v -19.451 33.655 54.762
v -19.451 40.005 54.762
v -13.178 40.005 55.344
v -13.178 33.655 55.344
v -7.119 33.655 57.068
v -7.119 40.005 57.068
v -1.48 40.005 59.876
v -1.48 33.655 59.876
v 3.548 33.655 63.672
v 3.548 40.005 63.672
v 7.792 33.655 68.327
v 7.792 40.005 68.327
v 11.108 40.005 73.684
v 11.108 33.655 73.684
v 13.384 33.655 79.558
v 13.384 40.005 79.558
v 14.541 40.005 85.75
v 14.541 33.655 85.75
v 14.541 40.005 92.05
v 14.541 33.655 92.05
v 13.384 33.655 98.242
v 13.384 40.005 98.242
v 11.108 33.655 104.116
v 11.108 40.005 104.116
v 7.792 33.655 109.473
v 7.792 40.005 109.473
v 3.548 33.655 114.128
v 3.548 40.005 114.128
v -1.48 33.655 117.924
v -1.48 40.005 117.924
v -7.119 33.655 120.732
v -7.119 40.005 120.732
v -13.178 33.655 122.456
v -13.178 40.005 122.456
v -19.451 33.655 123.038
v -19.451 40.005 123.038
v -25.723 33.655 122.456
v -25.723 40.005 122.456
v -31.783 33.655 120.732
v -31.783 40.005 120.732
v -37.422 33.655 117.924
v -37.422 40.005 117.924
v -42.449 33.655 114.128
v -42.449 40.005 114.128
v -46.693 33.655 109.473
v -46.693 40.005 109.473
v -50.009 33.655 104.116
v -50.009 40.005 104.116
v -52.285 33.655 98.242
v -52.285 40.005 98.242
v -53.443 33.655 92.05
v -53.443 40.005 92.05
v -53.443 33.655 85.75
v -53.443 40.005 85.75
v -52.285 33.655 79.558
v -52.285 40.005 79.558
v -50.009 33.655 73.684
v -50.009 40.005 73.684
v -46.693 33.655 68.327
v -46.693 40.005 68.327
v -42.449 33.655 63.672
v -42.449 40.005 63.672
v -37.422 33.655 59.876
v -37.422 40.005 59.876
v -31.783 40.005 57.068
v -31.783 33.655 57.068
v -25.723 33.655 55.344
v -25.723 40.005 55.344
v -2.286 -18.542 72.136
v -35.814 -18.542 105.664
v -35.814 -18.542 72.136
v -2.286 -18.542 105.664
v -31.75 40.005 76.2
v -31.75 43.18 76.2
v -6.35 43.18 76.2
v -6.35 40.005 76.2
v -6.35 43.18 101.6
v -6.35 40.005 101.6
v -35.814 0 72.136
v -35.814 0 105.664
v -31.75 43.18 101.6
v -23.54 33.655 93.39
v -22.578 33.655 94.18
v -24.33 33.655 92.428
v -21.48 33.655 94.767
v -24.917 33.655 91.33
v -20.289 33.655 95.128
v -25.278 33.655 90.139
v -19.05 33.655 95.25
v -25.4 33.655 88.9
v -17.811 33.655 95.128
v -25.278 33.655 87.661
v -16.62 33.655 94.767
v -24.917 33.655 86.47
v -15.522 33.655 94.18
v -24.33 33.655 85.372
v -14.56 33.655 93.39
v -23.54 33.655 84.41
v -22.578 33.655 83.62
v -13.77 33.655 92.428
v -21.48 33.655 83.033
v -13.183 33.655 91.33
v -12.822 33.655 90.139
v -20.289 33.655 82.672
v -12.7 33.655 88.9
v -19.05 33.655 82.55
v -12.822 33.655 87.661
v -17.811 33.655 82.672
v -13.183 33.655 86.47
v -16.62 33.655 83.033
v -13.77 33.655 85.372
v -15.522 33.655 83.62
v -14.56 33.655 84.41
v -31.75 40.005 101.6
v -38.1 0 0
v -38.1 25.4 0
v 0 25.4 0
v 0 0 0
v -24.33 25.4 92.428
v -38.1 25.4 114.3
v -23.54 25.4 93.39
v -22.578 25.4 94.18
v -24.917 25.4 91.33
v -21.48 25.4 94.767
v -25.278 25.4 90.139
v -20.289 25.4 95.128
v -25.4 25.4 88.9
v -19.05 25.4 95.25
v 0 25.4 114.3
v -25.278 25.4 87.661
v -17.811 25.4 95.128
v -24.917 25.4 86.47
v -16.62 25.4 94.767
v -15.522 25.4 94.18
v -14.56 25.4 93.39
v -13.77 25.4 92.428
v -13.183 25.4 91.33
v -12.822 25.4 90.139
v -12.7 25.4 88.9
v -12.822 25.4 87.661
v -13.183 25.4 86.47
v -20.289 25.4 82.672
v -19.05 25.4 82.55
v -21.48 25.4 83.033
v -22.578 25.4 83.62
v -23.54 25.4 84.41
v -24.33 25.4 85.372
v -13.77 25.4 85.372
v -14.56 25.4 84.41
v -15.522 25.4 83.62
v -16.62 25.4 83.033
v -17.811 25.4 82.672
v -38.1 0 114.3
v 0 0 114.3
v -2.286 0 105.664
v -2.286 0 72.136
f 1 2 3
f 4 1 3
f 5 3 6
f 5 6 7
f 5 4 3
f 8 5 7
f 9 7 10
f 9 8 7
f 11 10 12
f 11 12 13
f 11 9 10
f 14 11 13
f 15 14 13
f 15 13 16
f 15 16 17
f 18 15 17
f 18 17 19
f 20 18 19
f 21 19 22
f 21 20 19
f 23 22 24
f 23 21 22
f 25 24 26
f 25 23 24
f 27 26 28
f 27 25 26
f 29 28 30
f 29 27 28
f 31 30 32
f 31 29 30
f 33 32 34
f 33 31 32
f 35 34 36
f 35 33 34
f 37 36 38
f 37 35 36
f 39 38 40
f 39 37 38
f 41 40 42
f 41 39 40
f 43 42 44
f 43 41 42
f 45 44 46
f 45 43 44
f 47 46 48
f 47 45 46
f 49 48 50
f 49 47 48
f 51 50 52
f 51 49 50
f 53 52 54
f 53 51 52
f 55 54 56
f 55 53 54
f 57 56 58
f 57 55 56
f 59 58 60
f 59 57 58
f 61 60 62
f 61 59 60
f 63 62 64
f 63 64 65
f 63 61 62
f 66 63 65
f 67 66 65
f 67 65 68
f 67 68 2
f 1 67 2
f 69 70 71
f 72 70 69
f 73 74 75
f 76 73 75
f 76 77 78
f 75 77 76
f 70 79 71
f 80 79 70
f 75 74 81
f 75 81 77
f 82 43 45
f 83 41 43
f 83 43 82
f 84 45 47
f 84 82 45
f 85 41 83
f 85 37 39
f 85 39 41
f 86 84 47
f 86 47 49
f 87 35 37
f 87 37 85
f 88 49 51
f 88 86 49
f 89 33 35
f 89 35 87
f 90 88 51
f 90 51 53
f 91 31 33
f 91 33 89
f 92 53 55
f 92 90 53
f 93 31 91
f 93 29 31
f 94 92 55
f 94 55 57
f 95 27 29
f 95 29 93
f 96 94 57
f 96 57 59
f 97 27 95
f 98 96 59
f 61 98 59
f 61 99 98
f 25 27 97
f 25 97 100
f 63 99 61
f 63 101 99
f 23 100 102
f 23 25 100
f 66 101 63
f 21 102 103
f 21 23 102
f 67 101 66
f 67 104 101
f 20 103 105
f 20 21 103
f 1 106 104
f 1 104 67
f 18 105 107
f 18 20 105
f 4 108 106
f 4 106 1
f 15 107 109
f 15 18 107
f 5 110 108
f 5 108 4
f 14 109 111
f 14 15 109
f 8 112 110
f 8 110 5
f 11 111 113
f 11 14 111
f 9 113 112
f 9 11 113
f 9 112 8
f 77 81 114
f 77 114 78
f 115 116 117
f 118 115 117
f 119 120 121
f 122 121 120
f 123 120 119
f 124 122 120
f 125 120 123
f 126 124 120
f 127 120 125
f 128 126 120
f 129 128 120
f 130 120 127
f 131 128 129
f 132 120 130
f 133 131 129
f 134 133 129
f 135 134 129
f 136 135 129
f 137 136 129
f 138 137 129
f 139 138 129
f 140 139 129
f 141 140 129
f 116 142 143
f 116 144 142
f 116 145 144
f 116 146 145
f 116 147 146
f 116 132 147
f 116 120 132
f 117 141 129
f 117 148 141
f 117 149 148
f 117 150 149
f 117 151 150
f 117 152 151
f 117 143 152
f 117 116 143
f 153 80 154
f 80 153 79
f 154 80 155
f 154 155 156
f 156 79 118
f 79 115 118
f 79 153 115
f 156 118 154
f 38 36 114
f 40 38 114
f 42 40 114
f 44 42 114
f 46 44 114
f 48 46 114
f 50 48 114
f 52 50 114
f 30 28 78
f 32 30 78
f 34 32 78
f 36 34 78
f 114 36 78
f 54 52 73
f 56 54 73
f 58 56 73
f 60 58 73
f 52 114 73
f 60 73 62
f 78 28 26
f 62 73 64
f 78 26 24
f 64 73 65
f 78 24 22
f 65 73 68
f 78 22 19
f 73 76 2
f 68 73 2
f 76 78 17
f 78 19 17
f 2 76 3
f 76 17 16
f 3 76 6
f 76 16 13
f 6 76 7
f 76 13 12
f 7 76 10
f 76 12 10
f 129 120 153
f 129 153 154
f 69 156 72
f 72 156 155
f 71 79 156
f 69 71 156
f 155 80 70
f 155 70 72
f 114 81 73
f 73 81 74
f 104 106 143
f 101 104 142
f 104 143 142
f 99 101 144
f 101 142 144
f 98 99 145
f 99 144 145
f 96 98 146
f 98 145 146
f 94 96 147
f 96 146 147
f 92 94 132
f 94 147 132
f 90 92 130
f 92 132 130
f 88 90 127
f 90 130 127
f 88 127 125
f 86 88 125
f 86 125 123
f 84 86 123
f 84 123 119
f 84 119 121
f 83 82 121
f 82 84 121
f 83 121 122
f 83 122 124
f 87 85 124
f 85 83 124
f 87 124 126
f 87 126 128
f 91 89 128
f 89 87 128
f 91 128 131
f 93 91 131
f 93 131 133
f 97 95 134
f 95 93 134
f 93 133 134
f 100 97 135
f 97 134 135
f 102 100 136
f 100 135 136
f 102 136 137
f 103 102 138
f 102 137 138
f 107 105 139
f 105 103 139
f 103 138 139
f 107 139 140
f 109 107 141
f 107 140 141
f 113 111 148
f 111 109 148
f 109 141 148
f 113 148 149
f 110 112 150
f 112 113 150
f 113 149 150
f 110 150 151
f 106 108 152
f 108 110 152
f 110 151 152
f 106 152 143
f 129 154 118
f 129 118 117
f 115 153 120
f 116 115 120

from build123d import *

# Parameters (mm, degrees)
SKETCH1_W           = 38.1
SKETCH1_H           = 25.4
BOSS_EXTRUDE1_DEPTH = 114.3
SKETCH3_W           = 33.528
SKETCH3_H           = 33.528
BOSS_EXTRUDE2_DEPTH = 18.542
SKETCH2_R           = 6.35
BOSS_EXTRUDE3_DEPTH = 17.78
SKETCH4_W           = 25.4
SKETCH4_H           = 25.4
BOSS_EXTRUDE4_DEPTH = 6.35
SKETCH5_R           = 34.1376
BOSS_EXTRUDE5_DEPTH = 3.175


with BuildPart() as part:
    # Sketch1 → Boss-Extrude1 (new body)
    with BuildSketch(Plane.XY):
        with Locations((-19.05, 12.7)):
            Rectangle(SKETCH1_W, SKETCH1_H)
    extrude(amount=BOSS_EXTRUDE1_DEPTH)

    # Sketch3 → Boss-Extrude2 (add)
    with BuildSketch(Plane.XZ):
        with Locations((-19.05, 88.9)):
            Rectangle(SKETCH3_W, SKETCH3_H)
    extrude(amount=BOSS_EXTRUDE2_DEPTH)

    # Sketch2 → Boss-Extrude3 (add)
    with BuildSketch(Plane(origin=(0, 25.4, 0), x_dir=(1, 0, 0), z_dir=(0, 1, 0))):
        with Locations(Location((-19.05, -88.9, 0), (0, 0, 90))):
            Circle(SKETCH2_R)
    extrude(amount=BOSS_EXTRUDE3_DEPTH)

    # Sketch4 → Boss-Extrude4 (add)
    with BuildSketch(Plane(origin=(0, 43.18, 0), x_dir=(1, 0, 0), z_dir=(0, 1, 0))):
        with Locations((-19.05, -88.9)):
            Rectangle(SKETCH4_W, SKETCH4_H)
    extrude(amount=-BOSS_EXTRUDE4_DEPTH)

    # Sketch5 → Boss-Extrude5 (add, symmetric)
    with BuildSketch(Plane.XZ.offset(-36.83)):
        with Locations(Location((-19.450692706, 88.9, 0), (0, 0, 270))):
            Circle(SKETCH5_R)
    extrude(amount=BOSS_EXTRUDE5_DEPTH, both=True)


solid = part.part
